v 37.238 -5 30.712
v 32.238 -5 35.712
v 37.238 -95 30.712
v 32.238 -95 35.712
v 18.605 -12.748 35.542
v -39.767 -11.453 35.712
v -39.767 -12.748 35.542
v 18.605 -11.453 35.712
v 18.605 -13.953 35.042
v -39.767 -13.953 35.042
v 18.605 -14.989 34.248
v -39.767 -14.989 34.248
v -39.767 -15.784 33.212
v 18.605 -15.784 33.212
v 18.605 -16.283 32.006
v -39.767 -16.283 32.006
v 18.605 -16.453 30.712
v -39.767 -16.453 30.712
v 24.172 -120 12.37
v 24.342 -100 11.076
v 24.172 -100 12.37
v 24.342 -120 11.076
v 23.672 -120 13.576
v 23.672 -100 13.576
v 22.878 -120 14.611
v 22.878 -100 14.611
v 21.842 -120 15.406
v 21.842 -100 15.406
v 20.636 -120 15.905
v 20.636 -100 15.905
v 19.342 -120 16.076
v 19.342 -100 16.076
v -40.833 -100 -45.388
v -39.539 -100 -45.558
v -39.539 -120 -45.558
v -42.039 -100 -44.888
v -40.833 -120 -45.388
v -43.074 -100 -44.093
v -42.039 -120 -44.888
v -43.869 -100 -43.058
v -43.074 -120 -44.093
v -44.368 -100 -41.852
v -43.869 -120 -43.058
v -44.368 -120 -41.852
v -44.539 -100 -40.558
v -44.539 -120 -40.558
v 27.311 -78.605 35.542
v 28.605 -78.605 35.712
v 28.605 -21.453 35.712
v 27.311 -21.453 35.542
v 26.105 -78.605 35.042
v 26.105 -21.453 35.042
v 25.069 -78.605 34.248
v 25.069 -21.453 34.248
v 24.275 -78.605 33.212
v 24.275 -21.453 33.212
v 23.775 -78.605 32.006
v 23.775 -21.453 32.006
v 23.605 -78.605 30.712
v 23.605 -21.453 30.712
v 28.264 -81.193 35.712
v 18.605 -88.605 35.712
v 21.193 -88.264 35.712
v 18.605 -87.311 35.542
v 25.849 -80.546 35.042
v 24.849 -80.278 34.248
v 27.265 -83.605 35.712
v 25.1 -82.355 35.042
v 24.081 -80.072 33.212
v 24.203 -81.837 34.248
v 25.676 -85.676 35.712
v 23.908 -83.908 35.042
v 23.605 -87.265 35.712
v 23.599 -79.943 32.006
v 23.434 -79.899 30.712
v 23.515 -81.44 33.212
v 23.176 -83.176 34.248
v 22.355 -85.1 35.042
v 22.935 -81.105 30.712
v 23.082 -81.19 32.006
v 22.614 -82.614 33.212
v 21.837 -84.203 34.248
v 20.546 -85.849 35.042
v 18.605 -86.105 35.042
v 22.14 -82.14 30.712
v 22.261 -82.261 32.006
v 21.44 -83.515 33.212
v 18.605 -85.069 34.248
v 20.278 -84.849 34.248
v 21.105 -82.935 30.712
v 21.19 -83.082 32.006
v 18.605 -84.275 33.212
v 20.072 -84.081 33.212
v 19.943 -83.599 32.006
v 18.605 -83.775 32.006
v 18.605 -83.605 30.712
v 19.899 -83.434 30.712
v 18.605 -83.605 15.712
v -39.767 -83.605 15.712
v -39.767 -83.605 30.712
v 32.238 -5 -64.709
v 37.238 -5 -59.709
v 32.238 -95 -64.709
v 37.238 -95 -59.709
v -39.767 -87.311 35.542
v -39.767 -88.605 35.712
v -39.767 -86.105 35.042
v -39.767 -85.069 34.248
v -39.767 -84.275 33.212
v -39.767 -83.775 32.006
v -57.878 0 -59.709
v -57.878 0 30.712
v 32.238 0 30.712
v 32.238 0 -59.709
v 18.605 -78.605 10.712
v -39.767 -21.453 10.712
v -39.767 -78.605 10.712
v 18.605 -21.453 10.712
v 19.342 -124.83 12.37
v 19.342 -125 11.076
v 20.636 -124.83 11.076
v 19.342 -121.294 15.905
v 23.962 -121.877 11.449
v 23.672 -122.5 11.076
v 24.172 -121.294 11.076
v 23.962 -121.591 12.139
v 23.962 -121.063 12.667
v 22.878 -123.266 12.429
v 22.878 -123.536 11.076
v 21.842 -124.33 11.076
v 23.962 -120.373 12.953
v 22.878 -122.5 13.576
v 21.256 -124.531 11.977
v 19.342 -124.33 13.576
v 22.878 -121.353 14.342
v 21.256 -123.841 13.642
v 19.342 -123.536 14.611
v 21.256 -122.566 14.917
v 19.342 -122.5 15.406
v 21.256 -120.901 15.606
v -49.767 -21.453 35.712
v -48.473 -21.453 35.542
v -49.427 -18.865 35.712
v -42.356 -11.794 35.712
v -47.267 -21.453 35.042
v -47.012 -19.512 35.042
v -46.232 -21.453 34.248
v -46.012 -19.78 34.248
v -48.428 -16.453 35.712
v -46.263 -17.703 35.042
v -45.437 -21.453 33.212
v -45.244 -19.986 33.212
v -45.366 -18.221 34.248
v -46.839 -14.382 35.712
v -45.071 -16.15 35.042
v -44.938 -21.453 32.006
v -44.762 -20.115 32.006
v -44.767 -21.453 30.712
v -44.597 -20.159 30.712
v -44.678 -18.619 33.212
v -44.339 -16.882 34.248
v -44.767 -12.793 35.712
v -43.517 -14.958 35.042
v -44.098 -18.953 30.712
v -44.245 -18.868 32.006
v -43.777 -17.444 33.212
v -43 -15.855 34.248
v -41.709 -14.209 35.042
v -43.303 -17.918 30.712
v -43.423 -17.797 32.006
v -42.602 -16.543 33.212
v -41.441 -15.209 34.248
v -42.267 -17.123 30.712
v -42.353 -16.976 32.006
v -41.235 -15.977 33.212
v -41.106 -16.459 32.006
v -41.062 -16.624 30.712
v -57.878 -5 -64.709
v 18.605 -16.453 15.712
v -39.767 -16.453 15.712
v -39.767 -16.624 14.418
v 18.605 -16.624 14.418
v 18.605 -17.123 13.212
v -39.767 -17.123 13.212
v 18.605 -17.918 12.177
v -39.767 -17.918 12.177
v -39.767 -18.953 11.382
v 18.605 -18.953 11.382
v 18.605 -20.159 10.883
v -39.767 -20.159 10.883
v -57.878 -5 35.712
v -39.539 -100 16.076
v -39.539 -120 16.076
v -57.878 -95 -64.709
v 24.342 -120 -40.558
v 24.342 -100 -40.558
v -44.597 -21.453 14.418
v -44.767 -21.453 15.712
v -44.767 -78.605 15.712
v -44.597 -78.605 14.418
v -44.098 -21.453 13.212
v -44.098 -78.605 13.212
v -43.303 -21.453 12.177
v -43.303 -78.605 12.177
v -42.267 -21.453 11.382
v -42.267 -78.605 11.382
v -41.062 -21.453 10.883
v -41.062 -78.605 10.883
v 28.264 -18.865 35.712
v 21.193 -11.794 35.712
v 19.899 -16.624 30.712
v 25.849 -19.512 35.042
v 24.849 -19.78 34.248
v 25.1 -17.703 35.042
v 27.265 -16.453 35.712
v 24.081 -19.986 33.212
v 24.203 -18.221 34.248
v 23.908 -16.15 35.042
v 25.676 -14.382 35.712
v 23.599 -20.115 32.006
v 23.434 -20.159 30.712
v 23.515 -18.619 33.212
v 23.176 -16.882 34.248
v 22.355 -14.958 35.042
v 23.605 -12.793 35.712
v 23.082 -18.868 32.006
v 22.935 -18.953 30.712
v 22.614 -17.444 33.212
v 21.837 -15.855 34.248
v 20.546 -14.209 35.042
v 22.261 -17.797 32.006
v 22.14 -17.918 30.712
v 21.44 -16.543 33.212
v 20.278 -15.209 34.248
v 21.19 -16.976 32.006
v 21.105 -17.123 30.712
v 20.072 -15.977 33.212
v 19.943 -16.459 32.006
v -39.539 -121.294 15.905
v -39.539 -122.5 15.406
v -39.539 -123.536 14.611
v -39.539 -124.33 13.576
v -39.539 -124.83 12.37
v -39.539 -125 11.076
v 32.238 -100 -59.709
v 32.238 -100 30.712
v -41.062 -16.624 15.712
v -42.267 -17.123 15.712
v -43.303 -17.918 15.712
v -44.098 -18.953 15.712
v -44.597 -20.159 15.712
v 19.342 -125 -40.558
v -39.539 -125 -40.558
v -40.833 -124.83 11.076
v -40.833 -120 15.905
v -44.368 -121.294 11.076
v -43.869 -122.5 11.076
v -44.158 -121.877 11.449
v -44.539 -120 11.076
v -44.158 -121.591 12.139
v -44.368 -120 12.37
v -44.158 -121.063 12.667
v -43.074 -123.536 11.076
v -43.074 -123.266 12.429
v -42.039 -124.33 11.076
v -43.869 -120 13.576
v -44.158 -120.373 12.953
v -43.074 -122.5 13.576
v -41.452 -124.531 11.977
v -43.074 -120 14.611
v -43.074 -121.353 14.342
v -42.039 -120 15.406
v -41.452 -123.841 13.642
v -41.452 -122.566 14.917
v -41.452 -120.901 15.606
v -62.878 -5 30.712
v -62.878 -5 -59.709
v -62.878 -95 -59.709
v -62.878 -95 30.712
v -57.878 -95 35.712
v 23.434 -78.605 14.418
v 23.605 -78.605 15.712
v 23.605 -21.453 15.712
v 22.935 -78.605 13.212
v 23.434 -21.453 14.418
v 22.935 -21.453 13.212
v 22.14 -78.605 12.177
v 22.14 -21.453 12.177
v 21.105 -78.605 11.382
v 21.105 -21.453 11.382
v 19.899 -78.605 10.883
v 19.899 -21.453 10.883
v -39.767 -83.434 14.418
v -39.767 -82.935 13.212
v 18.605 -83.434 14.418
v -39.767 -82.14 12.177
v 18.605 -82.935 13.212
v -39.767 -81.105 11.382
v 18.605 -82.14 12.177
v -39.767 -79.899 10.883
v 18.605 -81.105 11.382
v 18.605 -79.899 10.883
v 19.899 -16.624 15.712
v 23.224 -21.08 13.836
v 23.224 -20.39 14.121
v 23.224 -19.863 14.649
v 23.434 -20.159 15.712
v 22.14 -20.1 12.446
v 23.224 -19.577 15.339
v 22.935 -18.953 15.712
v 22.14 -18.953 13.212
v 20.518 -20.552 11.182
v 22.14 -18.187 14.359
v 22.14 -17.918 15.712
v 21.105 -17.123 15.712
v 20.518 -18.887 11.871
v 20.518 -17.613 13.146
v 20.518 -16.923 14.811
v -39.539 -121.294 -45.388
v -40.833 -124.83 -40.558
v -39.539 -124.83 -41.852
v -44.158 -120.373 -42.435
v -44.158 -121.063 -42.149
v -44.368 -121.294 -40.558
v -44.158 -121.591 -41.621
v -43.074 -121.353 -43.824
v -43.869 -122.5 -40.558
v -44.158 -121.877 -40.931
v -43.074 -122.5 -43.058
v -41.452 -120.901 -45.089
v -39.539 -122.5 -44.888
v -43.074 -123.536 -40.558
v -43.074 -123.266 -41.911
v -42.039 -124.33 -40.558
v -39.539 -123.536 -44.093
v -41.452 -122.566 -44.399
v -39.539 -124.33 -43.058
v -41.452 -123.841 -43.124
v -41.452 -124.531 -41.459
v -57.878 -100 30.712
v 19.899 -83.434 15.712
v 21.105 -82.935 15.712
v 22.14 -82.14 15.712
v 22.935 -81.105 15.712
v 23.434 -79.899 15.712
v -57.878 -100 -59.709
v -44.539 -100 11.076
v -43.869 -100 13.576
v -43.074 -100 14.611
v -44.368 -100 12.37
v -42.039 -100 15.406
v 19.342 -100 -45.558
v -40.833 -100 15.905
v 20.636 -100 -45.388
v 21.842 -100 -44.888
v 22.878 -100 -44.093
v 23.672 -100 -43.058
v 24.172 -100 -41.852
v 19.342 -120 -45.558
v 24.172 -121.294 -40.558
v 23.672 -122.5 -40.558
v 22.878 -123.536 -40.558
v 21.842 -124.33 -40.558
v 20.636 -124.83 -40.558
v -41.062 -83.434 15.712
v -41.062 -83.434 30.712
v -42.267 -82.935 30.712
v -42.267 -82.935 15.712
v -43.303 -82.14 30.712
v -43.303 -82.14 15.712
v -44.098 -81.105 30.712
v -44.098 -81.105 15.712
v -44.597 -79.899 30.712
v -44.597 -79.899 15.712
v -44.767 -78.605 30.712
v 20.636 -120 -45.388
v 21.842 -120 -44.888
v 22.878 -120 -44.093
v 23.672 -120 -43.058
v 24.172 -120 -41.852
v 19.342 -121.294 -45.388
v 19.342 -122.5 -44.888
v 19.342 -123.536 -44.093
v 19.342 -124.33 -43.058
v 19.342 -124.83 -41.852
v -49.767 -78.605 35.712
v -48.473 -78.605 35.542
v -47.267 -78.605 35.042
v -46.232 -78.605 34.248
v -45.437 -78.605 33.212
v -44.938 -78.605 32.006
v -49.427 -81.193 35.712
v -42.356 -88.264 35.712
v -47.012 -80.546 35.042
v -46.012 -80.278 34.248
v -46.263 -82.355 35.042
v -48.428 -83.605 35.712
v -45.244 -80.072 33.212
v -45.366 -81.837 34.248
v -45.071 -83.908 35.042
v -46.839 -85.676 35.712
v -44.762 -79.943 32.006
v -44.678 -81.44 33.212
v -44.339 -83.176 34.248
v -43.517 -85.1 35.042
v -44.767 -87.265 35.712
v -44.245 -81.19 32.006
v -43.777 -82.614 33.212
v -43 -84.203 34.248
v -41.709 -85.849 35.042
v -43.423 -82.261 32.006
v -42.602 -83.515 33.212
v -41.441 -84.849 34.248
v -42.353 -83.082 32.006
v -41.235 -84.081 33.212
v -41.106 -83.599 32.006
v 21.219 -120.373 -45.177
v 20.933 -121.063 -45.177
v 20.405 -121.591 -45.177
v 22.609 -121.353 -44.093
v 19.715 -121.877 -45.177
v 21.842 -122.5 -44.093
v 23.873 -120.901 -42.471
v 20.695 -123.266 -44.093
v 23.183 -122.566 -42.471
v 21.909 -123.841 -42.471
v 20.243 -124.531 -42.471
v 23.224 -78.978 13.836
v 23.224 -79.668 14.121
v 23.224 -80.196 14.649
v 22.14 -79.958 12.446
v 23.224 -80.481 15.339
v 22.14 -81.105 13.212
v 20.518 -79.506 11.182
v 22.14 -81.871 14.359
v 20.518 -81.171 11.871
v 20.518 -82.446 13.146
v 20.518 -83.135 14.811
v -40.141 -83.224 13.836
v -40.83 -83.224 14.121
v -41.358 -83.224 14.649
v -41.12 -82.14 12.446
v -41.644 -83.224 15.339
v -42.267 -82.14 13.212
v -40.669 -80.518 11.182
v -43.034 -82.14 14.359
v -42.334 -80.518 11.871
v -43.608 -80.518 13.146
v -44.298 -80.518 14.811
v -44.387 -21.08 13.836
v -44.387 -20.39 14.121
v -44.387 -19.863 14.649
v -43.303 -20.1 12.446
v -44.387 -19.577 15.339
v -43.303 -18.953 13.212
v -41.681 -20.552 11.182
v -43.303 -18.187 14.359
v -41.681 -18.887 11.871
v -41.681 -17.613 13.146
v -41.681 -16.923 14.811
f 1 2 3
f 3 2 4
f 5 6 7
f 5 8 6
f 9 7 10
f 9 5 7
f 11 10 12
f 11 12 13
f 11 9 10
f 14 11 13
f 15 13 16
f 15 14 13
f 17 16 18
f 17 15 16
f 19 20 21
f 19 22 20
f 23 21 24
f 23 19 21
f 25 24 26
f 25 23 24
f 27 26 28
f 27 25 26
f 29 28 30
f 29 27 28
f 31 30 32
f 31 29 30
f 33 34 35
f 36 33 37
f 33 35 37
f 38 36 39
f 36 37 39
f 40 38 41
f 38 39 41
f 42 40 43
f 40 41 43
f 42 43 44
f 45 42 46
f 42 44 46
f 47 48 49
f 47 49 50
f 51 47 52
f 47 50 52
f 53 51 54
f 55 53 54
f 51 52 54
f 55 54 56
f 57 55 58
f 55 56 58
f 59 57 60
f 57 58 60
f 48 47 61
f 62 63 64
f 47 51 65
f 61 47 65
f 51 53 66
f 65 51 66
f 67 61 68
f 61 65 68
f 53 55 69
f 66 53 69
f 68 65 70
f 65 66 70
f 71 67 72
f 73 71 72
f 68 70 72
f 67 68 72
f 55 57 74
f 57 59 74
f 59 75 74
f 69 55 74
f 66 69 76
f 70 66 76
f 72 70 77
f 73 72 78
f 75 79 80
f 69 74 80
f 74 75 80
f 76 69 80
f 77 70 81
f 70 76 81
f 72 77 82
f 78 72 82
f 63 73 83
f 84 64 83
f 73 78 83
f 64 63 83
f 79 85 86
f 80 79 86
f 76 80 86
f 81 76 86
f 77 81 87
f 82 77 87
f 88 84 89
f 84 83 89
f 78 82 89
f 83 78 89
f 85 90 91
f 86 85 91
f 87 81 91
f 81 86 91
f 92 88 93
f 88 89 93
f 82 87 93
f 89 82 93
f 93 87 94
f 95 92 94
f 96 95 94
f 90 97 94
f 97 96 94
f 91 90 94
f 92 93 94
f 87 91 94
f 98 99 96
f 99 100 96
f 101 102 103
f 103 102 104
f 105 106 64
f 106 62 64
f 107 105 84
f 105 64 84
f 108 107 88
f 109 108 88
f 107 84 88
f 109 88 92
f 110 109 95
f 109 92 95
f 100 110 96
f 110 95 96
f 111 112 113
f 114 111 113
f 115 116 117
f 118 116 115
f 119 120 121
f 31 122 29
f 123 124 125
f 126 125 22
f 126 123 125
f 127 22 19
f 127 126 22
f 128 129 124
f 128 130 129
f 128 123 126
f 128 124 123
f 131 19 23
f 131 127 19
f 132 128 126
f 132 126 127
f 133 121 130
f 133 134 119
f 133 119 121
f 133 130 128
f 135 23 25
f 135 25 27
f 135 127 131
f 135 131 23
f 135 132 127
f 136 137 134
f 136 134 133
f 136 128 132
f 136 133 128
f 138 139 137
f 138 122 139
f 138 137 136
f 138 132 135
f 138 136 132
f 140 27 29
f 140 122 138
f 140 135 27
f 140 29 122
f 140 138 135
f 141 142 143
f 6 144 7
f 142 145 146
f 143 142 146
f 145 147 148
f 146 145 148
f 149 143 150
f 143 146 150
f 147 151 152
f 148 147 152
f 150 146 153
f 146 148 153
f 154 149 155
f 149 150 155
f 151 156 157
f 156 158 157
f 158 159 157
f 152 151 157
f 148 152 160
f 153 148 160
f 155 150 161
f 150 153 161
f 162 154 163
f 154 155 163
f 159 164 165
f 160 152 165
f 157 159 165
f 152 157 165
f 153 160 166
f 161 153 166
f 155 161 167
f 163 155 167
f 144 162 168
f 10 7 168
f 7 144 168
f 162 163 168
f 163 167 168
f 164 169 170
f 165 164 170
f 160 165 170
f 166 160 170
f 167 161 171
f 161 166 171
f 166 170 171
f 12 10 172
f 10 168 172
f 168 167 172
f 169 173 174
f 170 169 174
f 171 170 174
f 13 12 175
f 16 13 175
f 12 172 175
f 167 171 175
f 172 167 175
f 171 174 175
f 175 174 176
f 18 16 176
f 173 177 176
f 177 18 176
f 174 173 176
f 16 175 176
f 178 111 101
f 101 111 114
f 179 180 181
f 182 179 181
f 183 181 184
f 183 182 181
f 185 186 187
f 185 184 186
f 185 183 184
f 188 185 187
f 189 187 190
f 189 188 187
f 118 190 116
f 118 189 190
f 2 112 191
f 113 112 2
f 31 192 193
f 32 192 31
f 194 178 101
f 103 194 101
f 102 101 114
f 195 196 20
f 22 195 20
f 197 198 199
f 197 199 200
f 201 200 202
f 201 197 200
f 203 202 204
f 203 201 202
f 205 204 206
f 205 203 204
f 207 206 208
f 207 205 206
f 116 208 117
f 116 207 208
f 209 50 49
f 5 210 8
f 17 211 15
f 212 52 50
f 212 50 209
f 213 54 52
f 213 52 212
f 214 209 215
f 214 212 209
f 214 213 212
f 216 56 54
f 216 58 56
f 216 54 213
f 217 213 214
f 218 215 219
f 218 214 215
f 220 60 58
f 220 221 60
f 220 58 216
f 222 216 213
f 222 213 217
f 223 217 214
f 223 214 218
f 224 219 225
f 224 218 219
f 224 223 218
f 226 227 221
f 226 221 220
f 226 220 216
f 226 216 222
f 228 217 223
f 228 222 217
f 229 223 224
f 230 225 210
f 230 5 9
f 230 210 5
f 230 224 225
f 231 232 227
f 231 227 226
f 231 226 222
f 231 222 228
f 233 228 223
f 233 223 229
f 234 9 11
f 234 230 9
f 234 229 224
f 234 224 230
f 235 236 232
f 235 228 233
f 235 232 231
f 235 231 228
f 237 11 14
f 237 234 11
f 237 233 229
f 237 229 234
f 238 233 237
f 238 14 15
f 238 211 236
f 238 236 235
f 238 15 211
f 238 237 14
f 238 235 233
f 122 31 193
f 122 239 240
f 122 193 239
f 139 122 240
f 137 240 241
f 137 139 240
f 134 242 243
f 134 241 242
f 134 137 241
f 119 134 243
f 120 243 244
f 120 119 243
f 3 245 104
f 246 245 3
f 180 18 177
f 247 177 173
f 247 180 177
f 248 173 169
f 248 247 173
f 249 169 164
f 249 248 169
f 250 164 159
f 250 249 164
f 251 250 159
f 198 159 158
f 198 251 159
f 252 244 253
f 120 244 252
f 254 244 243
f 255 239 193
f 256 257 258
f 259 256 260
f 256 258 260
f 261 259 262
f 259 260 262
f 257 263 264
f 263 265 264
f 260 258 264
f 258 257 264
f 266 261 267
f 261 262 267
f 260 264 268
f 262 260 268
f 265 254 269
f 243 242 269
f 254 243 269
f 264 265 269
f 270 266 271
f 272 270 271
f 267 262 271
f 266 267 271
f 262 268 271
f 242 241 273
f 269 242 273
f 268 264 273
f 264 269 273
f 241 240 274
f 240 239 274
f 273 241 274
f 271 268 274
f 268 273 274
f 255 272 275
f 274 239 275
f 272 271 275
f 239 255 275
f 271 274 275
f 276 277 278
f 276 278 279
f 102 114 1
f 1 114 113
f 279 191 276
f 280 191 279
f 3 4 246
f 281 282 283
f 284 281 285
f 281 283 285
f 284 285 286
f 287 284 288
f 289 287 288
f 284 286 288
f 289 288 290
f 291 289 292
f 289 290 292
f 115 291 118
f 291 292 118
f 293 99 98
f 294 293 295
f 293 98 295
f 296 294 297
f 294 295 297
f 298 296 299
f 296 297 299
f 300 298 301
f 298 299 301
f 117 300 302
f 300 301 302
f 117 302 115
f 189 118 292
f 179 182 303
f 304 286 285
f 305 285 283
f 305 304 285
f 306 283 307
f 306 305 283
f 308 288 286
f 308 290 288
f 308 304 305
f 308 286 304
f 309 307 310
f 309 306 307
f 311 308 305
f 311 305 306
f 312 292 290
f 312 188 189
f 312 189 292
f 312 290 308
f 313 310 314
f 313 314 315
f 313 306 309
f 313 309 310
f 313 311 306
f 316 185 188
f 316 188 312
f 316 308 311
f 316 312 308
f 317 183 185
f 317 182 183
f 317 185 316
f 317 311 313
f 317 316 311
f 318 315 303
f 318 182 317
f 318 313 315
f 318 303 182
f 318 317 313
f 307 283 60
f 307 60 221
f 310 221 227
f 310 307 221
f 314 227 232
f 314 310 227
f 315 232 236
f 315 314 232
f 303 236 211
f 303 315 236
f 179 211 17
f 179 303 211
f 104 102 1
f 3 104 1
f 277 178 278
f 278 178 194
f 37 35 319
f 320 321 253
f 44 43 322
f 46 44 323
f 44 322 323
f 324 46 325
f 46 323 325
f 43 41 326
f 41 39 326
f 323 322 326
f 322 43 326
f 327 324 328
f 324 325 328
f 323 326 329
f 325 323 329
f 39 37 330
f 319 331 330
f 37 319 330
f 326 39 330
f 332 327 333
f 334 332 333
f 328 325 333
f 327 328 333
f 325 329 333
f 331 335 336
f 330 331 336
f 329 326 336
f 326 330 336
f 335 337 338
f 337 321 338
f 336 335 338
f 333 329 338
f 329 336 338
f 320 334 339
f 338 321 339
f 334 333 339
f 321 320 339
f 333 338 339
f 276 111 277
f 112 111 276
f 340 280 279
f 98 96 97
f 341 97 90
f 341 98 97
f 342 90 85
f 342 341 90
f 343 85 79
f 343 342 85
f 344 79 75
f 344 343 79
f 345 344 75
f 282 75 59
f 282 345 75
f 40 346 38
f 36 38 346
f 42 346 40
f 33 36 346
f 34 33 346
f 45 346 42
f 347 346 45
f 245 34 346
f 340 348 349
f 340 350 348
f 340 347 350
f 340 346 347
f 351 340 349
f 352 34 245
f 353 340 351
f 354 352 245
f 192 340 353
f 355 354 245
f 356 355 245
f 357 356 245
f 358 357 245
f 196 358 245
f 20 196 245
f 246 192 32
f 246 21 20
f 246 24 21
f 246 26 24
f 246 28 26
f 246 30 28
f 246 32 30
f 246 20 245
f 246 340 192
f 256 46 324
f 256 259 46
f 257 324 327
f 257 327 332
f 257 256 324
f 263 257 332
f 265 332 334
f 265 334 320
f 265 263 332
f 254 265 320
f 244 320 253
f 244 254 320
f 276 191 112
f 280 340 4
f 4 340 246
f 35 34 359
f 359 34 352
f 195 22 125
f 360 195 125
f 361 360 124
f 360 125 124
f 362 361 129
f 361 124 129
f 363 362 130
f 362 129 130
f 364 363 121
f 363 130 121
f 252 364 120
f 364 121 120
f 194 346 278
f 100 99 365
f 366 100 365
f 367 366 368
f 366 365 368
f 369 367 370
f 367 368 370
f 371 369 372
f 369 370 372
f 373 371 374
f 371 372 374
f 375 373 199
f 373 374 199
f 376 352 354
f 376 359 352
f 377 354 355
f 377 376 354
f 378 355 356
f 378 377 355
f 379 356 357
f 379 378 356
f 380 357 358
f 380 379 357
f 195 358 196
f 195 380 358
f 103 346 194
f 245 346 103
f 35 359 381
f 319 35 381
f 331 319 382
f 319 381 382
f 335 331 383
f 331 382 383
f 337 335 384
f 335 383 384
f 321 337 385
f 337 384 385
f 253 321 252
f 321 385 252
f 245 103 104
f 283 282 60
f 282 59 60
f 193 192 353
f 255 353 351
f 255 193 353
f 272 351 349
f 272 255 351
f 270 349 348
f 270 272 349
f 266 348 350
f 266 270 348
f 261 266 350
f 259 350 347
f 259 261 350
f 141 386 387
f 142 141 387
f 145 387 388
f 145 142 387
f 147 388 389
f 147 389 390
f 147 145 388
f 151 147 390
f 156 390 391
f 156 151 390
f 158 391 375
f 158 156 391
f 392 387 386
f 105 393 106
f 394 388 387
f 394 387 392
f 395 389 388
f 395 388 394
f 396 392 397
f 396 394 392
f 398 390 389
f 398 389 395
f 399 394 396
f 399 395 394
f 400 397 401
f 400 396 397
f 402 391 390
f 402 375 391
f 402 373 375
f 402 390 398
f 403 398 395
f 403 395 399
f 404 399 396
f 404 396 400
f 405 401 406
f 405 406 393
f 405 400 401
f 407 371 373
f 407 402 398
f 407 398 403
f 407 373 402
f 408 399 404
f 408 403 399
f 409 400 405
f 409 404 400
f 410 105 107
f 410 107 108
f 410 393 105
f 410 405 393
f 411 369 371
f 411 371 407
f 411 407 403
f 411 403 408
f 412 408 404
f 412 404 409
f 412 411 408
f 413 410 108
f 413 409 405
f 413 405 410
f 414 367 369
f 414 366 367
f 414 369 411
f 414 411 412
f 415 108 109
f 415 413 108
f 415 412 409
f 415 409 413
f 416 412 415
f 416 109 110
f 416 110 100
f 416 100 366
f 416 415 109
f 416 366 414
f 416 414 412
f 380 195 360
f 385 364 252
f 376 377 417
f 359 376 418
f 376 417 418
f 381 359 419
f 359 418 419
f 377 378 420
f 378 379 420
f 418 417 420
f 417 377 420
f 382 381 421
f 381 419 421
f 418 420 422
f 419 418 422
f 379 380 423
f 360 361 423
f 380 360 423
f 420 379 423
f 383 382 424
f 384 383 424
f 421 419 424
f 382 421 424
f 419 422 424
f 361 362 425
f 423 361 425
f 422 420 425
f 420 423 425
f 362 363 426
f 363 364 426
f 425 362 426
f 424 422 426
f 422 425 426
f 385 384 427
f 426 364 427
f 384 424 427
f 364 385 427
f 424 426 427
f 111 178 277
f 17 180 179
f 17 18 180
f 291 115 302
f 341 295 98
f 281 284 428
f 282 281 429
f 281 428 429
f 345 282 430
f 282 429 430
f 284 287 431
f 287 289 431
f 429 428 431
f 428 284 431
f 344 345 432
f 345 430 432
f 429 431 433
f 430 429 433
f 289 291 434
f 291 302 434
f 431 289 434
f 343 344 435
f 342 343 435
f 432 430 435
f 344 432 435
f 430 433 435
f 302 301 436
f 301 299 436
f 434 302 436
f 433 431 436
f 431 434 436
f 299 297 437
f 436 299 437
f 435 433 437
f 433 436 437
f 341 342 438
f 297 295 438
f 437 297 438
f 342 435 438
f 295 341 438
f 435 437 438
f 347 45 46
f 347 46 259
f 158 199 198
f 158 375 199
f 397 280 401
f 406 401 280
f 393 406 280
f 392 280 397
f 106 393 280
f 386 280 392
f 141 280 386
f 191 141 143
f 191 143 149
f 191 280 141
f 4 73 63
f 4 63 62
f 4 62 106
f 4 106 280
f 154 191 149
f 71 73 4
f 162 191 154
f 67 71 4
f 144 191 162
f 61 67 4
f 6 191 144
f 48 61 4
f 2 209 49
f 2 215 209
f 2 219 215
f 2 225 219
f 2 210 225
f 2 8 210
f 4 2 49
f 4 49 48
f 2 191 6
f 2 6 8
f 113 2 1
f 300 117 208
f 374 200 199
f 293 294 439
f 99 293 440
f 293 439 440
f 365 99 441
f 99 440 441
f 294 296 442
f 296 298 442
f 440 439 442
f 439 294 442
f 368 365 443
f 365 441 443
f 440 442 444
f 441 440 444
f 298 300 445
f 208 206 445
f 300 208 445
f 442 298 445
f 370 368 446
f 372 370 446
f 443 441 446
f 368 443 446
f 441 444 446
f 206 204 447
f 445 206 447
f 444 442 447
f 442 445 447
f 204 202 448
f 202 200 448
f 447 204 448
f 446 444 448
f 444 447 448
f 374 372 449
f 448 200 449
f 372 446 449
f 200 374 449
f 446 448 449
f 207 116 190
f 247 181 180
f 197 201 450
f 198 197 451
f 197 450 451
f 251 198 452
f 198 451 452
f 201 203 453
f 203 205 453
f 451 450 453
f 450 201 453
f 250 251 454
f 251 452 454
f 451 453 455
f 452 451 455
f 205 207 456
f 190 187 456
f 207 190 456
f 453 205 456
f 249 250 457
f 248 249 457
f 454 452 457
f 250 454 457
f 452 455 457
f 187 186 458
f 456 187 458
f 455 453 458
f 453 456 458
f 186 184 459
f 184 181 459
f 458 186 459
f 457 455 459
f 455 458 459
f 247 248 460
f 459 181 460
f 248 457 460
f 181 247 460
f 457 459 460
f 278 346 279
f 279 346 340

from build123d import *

# Parameters (mm, degrees)
F0_W     = 100.1162827015
F0_H     = 100.4215180874
F1_DEPTH = 100
F2_SIZE  = 5
F3_W     = 68.8809547573
F3_H     = 61.6337545216
F4_DEPTH = 25
F5_R     = 5
F6_W     = 68.3720968664
F6_H     = 67.151170224
F7_DEPTH = 25
F8_R     = 5


with BuildPart() as f1:
    # F0 (on Front) → F1 (new body)
    with BuildSketch(Plane.XZ):
        with Locations((-12.8197669983, -14.4985467196)):
            Rectangle(F0_W, F0_H)
    extrude(amount=F1_DEPTH)

    # F2
    f2_edges = [f1.edges().sort_by_distance(p)[0] for p in [
        (37.238374, -50, -64.709306),
        (-62.877908, -50, 35.712212),
        (-12.819767, -100, 35.712212),
        (-12.819767, 0, 35.712212),
        (37.238374, -50, 35.712212),
        (-12.819767, -100, -64.709306),
        (-12.819767, 0, -64.709306),
        (-62.877908, -100, -14.498547),
        (-62.877908, -50, -64.709306),
        (37.238374, -100, -14.498547),
        (-62.877908, 0, -14.498547),
        (37.238374, 0, -14.498547),
    ]]
    chamfer(f2_edges, length=F2_SIZE)

    # F3 (on face) → F4 (join)
    with BuildSketch(Plane.XZ.offset(100)):
        with Locations((-10.0983185694, -14.7410277277)):
            Rectangle(F3_W, F3_H)
    extrude(amount=F4_DEPTH)

    # F5
    f5_edges = [f1.edges().sort_by_distance(p)[0] for p in [
        (-10.098319, -125, 16.07585),
        (24.342159, -125, -14.741028),
        (24.342159, -112.5, 16.07585),
        (24.342159, -112.5, -45.557905),
        (-10.098319, -125, -45.557905),
        (-44.538796, -112.5, -45.557905),
        (-44.538796, -125, -14.741028),
        (-44.538796, -112.5, 16.07585),
    ]]
    fillet(f5_edges, radius=F5_R)

    # F6 (on face) → F7 (cut)
    with BuildSketch(Plane.XY.offset(35.7122123241)):
        with Locations((-10.5813946575, -50.0290710479)):
            Rectangle(F6_W, F6_H)
    extrude(amount=-F7_DEPTH, mode=Mode.SUBTRACT)

    # F8
    f8_edges = [f1.edges().sort_by_distance(p)[0] for p in [
        (-10.581395, -16.453486, 10.712212),
        (-44.767443, -50.029071, 10.712212),
        (-10.581395, -83.604656, 10.712212),
        (23.604654, -50.029071, 10.712212),
        (23.604654, -16.453486, 23.212212),
        (-44.767443, -16.453486, 23.212212),
        (-44.767443, -83.604656, 23.212212),
        (-44.767443, -50.029071, 35.712212),
        (23.604654, -83.604656, 23.212212),
        (23.604654, -50.029071, 35.712212),
        (-10.581395, -83.604656, 35.712212),
        (-10.581395, -16.453486, 35.712212),
    ]]
    fillet(f8_edges, radius=F8_R)


solid = f1.part
